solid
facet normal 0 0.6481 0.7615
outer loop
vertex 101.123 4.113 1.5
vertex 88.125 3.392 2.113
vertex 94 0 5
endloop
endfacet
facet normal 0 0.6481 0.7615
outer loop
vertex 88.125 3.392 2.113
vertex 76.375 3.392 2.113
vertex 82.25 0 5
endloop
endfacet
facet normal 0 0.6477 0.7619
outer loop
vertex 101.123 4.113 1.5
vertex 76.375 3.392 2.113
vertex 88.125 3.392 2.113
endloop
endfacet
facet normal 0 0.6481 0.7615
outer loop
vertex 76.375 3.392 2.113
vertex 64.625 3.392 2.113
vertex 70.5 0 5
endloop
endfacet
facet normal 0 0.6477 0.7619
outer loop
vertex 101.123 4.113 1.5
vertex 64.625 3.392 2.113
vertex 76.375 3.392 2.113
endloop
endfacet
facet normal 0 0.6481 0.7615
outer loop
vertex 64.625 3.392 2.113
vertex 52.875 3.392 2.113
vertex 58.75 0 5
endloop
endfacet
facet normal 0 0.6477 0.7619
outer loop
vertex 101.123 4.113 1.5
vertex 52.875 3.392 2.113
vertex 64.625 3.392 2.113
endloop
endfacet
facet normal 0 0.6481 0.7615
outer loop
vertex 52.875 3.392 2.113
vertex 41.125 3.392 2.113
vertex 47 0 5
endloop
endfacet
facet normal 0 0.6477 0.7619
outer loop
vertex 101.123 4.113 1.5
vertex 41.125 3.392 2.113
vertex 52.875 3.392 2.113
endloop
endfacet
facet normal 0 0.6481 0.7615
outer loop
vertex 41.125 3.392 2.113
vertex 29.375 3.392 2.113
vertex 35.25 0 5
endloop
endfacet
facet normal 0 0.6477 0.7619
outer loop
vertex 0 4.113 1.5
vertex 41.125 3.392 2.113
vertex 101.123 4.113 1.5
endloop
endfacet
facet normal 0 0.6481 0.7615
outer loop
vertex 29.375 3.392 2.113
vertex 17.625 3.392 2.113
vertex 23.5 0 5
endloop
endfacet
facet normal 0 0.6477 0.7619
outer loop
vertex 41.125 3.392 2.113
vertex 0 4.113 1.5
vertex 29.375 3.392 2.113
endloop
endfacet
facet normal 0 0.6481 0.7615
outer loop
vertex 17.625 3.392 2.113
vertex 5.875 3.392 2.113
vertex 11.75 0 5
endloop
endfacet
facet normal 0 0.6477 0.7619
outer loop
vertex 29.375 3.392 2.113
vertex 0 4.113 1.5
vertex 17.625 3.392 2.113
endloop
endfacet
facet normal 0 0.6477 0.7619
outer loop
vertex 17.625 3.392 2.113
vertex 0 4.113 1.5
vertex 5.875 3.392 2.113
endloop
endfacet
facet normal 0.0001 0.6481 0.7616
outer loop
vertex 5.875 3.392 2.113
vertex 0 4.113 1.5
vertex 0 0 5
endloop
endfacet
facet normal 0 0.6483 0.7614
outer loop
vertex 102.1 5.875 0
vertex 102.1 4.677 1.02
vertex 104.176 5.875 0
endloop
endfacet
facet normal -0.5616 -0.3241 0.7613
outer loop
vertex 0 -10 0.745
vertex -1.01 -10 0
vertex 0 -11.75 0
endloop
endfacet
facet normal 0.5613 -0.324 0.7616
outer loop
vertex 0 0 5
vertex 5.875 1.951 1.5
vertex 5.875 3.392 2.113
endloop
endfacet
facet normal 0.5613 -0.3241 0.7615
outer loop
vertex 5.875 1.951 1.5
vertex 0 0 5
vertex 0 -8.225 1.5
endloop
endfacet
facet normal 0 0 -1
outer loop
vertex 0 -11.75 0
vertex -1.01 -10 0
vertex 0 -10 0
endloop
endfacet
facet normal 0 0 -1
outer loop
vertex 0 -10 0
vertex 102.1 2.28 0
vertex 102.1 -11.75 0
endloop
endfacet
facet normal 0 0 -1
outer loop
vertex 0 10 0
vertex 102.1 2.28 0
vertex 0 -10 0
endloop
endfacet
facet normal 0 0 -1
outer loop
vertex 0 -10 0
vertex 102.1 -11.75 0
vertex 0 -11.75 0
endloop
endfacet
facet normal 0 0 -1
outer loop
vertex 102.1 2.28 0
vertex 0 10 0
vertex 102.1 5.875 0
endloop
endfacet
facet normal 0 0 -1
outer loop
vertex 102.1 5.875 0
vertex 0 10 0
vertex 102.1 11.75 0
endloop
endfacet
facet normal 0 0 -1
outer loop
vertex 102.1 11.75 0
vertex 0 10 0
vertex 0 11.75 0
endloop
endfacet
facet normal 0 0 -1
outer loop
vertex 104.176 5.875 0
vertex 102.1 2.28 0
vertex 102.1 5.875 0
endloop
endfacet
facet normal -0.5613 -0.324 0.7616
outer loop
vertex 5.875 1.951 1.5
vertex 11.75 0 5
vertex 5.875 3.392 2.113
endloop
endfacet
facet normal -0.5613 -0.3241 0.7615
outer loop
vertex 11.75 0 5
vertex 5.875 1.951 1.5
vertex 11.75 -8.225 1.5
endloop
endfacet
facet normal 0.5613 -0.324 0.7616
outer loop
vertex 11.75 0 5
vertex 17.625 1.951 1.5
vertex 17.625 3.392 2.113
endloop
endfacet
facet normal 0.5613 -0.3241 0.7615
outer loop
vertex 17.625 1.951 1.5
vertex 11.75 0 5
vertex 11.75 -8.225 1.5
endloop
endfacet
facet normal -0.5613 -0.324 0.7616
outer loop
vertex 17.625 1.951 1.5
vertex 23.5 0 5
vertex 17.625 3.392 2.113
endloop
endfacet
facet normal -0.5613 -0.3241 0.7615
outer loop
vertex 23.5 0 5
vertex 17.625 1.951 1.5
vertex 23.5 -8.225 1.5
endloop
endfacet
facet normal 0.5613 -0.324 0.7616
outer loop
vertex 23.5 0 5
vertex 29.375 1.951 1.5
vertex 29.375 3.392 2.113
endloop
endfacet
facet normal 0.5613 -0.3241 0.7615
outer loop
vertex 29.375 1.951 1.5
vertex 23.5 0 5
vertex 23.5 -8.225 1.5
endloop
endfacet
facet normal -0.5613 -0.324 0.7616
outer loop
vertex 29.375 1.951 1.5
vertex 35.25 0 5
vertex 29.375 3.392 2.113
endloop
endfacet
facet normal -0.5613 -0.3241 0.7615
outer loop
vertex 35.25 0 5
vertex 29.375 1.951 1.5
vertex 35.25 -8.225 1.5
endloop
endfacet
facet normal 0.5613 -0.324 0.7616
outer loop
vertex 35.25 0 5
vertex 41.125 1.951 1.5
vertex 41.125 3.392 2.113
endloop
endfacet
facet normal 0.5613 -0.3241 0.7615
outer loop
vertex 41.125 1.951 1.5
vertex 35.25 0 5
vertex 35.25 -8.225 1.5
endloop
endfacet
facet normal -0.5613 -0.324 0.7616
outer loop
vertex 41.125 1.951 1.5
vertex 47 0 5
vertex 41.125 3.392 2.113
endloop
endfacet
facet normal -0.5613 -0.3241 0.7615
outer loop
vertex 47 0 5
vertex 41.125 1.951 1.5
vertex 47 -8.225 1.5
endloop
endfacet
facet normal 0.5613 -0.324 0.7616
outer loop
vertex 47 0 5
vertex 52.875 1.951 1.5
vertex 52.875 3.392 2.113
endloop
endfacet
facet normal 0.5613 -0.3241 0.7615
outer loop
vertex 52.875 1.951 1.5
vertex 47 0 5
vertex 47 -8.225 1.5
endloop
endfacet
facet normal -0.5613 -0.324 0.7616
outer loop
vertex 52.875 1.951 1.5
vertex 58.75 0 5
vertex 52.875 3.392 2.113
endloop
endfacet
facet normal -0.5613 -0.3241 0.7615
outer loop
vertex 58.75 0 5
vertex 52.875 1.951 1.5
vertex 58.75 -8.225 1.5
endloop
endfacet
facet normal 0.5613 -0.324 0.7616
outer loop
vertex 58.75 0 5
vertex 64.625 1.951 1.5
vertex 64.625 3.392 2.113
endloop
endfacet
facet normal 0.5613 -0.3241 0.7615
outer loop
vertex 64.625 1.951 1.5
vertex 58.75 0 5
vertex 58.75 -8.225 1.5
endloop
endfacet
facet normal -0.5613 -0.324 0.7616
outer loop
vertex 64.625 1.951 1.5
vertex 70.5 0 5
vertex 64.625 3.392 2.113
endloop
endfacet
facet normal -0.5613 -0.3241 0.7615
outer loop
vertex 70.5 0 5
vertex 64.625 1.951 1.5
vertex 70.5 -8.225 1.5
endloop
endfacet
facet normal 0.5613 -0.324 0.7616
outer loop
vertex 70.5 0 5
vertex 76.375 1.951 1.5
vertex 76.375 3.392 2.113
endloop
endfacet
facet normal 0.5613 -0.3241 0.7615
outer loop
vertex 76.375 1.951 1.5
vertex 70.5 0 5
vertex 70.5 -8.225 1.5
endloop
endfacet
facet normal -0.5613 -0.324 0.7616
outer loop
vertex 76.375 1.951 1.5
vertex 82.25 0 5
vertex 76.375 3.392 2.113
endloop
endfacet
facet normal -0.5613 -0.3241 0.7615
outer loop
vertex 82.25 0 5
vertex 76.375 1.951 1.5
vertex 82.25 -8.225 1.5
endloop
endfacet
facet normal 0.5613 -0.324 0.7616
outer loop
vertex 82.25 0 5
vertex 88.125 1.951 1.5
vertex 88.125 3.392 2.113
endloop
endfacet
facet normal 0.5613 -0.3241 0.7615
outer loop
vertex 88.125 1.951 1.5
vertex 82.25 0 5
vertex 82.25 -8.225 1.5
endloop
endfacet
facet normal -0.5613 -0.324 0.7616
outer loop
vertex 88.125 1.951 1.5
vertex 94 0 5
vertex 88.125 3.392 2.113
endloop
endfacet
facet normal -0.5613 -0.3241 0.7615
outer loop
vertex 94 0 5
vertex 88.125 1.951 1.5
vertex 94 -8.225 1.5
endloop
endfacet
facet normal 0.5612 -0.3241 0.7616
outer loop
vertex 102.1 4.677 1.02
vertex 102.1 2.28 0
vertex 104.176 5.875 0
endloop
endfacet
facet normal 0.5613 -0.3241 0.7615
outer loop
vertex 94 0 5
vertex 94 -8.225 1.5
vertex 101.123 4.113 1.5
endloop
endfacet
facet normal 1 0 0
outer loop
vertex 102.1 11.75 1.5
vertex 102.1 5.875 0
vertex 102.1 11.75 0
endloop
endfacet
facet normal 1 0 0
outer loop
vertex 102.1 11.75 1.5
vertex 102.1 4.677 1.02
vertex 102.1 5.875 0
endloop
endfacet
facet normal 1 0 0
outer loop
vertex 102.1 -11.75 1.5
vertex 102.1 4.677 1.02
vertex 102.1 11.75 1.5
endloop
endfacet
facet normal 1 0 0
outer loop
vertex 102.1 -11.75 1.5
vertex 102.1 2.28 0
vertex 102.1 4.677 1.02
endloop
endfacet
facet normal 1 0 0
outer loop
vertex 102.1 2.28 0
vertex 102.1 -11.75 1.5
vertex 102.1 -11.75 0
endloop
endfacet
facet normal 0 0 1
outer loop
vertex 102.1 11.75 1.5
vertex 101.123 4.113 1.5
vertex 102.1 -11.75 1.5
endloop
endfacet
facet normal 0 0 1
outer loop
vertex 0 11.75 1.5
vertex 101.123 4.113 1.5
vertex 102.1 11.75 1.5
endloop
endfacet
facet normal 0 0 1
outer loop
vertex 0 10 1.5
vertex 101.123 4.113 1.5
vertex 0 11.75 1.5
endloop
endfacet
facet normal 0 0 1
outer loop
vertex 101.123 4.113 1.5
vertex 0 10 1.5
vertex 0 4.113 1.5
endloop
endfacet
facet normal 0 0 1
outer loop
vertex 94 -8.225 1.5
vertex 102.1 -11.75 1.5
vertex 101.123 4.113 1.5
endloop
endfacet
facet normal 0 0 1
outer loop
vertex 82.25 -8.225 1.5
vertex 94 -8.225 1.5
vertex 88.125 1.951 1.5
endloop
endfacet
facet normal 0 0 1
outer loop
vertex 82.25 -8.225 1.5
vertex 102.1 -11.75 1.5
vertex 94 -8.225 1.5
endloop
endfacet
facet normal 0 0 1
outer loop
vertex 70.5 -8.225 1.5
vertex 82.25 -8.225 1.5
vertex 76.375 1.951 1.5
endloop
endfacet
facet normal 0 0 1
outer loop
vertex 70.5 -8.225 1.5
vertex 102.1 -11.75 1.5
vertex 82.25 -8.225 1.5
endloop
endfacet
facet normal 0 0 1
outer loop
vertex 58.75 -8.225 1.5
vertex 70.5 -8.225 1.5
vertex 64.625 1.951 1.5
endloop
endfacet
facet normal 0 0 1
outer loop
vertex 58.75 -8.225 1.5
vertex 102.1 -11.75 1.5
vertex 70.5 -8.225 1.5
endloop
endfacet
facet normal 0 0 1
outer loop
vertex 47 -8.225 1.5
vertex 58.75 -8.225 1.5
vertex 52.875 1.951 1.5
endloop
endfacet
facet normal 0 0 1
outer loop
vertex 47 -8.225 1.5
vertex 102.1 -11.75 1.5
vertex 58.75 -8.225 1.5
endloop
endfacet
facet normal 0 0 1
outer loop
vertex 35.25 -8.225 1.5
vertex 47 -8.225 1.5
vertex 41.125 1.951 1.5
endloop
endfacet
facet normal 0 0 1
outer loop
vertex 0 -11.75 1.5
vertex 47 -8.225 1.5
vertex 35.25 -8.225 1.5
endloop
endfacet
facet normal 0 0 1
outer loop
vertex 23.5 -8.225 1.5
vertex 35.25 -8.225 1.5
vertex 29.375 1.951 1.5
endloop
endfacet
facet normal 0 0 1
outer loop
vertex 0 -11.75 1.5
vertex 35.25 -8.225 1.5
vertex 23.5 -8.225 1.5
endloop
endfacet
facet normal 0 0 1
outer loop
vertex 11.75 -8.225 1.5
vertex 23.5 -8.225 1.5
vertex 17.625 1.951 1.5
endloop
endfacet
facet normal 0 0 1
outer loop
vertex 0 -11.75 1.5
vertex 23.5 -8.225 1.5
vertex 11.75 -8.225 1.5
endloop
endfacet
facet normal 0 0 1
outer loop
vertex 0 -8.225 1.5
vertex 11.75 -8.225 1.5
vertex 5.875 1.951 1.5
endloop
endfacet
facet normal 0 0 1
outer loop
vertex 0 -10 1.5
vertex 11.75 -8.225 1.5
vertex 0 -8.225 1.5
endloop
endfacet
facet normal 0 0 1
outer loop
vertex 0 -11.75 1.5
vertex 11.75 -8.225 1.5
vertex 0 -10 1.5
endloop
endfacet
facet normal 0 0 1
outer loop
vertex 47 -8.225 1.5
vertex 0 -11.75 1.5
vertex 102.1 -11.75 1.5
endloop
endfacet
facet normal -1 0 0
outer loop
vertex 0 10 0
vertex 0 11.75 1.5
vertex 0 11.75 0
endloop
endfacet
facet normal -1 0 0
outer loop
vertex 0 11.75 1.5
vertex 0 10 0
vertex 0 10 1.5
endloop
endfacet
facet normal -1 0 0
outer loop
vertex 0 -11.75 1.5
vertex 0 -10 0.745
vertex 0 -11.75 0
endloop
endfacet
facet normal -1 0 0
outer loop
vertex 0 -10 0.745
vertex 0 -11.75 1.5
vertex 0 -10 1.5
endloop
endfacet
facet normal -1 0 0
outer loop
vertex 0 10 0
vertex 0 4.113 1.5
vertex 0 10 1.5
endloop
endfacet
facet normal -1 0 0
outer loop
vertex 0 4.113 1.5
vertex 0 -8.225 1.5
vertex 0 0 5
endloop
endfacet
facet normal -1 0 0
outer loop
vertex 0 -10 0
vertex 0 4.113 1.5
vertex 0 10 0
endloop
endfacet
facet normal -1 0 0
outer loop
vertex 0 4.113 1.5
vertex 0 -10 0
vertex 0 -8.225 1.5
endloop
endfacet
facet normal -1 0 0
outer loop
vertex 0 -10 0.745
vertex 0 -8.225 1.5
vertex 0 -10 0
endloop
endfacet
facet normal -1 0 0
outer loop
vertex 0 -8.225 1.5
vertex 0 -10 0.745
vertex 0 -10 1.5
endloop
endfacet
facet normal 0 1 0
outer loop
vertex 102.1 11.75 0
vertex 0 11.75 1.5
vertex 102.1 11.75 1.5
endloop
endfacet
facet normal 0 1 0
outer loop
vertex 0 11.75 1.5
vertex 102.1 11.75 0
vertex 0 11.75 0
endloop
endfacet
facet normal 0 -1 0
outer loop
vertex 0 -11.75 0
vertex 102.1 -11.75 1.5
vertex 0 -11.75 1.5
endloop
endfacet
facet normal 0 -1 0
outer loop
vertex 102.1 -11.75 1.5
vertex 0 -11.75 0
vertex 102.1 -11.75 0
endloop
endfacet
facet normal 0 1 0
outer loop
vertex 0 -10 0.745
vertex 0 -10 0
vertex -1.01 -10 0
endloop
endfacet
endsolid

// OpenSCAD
$r = 23.5/2;
$r2 = 11 / 2;
$d = 1.5;
$fn = 3;
$links = 8;

difference() {
    union() {
for (i = [0:$links]) {
    
     translate([i * $r, 0, 2.5]) {
        rotate([0, 0, 30]) {
            cylinder(5, $r, 0, true);
        }
     }
}
translate([0, -$r, 0]) {
     cube([102.1, $r*2 , $d], false);
}
}
translate([-10, 0, 0]) {
    cube([20, 20, 20], true);
}
translate([($links) * $r + 10, 0, 0]) {
    //cube([20, 20, 20], true);
}
}
